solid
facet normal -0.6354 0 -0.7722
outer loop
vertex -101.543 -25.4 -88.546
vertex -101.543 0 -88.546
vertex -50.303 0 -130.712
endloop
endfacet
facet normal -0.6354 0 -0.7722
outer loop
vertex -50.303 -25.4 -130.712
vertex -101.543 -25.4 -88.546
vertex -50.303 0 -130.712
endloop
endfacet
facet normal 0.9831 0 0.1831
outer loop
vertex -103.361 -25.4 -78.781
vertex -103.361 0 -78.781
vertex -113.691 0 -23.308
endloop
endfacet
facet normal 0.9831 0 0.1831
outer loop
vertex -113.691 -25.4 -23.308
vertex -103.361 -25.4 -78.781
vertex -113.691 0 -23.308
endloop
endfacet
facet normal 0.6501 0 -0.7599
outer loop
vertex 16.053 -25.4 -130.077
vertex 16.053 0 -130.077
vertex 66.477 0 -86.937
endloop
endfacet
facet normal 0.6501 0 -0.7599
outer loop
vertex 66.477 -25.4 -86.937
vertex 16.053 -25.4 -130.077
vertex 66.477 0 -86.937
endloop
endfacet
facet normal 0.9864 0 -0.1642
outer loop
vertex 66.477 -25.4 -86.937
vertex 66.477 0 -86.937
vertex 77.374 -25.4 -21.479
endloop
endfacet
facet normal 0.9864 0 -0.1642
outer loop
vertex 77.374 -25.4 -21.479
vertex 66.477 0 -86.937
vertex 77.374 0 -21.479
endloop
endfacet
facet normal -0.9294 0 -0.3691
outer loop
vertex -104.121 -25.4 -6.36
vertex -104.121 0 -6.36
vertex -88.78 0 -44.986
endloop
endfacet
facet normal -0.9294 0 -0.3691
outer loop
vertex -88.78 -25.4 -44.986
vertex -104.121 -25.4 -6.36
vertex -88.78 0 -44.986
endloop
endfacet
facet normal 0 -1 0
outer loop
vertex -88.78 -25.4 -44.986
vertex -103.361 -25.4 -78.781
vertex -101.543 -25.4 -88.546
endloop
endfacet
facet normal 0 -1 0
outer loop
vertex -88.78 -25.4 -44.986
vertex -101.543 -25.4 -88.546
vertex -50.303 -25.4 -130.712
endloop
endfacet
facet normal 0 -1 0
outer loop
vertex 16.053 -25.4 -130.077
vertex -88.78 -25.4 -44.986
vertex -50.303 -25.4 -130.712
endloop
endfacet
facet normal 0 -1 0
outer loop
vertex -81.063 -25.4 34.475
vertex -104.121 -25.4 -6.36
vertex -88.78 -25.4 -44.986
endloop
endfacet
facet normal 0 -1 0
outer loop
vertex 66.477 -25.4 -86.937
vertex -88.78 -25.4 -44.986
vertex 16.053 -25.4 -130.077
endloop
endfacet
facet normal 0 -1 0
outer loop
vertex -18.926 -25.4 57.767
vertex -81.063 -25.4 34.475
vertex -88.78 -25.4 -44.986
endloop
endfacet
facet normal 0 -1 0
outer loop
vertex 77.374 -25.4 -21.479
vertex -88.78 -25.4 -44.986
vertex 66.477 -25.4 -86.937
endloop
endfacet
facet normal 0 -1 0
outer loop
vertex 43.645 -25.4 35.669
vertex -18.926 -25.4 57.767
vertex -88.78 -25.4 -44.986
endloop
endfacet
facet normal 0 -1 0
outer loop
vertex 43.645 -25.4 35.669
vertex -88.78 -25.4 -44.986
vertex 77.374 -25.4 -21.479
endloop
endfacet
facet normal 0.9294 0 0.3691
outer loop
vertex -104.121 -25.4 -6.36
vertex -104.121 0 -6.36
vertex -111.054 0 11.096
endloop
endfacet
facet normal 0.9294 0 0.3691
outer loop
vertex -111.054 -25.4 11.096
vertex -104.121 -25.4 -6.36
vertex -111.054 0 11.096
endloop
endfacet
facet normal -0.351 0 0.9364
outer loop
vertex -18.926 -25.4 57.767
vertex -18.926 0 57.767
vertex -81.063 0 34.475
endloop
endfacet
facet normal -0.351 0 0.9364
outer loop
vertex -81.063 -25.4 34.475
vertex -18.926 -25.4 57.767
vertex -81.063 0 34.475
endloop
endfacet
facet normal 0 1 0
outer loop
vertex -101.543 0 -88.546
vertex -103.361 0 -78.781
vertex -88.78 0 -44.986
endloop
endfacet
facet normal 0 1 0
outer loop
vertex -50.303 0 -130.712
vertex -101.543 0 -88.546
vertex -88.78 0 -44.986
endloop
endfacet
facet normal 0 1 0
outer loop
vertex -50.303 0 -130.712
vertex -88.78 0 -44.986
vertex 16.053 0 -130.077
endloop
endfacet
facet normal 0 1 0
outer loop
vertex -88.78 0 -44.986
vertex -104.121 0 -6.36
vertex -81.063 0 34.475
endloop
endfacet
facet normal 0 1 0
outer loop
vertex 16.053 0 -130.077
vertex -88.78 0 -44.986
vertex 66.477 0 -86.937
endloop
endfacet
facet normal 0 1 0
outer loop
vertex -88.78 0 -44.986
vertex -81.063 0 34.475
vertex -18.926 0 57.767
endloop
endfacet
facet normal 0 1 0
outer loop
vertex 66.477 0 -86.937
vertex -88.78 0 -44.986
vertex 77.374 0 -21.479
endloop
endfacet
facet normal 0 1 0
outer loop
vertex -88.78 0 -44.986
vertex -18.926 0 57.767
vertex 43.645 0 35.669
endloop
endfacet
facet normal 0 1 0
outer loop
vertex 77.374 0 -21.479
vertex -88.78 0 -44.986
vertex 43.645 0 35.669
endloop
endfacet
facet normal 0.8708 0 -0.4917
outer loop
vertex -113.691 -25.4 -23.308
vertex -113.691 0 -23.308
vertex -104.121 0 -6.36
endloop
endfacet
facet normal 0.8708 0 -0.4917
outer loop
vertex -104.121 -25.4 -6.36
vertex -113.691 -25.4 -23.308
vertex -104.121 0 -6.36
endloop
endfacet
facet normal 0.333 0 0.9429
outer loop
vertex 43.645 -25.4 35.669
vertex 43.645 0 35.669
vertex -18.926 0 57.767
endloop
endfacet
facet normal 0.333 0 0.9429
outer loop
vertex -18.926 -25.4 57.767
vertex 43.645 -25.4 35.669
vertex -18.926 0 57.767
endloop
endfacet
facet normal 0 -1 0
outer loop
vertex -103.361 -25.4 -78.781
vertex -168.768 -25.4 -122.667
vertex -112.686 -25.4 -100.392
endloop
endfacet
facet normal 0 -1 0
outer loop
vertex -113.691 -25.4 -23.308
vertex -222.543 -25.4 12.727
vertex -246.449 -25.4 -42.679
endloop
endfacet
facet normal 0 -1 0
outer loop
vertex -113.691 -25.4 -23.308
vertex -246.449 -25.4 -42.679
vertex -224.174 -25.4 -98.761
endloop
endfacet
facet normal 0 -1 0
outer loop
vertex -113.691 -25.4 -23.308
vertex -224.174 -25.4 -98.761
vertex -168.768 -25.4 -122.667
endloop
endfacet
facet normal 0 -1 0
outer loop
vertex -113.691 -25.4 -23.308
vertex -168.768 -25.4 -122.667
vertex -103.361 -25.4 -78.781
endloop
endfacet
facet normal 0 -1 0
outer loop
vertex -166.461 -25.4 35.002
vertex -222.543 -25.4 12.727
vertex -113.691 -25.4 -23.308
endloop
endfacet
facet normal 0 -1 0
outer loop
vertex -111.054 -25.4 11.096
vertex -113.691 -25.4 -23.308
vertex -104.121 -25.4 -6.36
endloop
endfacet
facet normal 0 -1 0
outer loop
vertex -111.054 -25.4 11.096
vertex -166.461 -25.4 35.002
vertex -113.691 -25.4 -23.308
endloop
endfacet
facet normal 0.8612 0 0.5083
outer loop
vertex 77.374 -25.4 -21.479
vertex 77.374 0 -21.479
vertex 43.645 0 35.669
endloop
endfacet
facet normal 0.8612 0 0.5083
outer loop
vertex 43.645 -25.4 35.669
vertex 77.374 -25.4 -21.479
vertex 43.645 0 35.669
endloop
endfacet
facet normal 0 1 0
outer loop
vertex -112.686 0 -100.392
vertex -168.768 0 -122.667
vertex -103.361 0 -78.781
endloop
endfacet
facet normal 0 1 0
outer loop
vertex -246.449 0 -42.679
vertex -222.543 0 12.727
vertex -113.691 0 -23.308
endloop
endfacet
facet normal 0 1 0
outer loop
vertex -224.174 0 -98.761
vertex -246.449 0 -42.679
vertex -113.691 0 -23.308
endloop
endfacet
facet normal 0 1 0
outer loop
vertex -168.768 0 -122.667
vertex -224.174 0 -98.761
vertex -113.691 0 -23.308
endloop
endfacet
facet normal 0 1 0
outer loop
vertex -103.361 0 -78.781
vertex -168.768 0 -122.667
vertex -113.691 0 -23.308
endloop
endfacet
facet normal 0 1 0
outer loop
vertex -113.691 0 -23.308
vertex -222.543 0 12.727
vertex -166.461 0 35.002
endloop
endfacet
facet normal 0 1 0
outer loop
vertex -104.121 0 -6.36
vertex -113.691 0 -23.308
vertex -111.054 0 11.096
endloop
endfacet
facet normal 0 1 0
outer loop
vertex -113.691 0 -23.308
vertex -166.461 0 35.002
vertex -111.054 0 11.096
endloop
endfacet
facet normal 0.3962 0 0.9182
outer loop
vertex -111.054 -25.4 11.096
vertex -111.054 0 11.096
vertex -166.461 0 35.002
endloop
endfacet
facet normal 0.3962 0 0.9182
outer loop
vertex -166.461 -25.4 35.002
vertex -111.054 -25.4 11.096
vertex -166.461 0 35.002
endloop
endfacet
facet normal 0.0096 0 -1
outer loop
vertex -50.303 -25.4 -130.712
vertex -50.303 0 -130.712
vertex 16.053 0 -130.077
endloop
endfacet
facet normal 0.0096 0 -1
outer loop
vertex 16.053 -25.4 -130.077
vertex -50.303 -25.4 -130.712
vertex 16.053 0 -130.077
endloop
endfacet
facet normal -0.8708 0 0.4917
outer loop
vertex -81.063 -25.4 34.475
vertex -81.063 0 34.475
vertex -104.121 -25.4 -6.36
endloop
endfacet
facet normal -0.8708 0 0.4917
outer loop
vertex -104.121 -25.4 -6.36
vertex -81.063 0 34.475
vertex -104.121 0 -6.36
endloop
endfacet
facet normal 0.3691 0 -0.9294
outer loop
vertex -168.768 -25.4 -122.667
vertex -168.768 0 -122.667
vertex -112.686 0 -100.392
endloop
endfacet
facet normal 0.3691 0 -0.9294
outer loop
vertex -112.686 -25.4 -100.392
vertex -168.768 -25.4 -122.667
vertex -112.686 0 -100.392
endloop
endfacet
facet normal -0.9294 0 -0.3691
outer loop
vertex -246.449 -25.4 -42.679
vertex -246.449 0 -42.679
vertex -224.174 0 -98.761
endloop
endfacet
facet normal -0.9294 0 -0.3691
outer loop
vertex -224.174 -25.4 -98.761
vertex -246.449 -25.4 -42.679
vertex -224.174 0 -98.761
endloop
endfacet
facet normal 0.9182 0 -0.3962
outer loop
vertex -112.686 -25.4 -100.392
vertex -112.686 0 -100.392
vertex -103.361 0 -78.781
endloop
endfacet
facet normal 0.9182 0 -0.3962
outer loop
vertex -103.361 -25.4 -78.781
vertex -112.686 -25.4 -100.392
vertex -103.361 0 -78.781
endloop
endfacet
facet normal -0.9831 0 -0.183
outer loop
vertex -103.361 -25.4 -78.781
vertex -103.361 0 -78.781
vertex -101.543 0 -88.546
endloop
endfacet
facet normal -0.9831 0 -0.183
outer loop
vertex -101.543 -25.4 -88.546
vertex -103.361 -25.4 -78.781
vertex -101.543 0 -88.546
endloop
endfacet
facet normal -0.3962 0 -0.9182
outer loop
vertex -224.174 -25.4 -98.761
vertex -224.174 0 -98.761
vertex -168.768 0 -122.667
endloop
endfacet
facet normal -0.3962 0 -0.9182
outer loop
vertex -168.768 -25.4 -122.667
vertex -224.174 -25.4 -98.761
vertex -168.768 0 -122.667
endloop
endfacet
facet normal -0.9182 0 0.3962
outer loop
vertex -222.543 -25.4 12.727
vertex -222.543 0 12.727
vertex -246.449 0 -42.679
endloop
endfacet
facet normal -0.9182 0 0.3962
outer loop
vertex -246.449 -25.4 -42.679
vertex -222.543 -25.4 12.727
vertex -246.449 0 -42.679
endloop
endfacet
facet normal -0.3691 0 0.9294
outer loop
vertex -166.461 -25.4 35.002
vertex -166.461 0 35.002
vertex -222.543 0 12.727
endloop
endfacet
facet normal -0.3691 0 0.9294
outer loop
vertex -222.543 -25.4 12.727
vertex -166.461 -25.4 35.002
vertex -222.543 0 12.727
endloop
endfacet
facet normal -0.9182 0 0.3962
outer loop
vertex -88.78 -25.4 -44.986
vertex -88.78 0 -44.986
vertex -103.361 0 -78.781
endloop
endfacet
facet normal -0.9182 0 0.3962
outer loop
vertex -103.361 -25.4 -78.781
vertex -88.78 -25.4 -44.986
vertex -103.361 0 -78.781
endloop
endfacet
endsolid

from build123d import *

# Parameters (mm, degrees)
F1_DEPTH = 25.4


with BuildPart() as f1:
    # F0 (on Front) → F1 (new body)
    with BuildSketch(Plane.XZ):
        Polygon((43.64546, 35.669267), (-18.926139, 57.767407), (-81.063176, 34.475315), (-104.121173, -6.360219), (-88.779969, -44.98597), (-103.361179, -78.781065), (-101.542791, -88.546044), (-50.30273, -130.71225), (16.053349, -130.076962), (66.4767, -86.937437), (77.373675, -21.479139), align=None)
        Polygon((-113.69104, -23.308379), (-104.121173, -6.360219), (-111.054445, 11.096222), (-166.460975, 35.001887), (-222.543166, 12.727412), (-246.448832, -42.679119), (-224.174356, -98.76131), (-168.767826, -122.666975), (-112.685635, -100.3925), (-103.361179, -78.781065), align=None)
    extrude(amount=F1_DEPTH)


solid = f1.part
